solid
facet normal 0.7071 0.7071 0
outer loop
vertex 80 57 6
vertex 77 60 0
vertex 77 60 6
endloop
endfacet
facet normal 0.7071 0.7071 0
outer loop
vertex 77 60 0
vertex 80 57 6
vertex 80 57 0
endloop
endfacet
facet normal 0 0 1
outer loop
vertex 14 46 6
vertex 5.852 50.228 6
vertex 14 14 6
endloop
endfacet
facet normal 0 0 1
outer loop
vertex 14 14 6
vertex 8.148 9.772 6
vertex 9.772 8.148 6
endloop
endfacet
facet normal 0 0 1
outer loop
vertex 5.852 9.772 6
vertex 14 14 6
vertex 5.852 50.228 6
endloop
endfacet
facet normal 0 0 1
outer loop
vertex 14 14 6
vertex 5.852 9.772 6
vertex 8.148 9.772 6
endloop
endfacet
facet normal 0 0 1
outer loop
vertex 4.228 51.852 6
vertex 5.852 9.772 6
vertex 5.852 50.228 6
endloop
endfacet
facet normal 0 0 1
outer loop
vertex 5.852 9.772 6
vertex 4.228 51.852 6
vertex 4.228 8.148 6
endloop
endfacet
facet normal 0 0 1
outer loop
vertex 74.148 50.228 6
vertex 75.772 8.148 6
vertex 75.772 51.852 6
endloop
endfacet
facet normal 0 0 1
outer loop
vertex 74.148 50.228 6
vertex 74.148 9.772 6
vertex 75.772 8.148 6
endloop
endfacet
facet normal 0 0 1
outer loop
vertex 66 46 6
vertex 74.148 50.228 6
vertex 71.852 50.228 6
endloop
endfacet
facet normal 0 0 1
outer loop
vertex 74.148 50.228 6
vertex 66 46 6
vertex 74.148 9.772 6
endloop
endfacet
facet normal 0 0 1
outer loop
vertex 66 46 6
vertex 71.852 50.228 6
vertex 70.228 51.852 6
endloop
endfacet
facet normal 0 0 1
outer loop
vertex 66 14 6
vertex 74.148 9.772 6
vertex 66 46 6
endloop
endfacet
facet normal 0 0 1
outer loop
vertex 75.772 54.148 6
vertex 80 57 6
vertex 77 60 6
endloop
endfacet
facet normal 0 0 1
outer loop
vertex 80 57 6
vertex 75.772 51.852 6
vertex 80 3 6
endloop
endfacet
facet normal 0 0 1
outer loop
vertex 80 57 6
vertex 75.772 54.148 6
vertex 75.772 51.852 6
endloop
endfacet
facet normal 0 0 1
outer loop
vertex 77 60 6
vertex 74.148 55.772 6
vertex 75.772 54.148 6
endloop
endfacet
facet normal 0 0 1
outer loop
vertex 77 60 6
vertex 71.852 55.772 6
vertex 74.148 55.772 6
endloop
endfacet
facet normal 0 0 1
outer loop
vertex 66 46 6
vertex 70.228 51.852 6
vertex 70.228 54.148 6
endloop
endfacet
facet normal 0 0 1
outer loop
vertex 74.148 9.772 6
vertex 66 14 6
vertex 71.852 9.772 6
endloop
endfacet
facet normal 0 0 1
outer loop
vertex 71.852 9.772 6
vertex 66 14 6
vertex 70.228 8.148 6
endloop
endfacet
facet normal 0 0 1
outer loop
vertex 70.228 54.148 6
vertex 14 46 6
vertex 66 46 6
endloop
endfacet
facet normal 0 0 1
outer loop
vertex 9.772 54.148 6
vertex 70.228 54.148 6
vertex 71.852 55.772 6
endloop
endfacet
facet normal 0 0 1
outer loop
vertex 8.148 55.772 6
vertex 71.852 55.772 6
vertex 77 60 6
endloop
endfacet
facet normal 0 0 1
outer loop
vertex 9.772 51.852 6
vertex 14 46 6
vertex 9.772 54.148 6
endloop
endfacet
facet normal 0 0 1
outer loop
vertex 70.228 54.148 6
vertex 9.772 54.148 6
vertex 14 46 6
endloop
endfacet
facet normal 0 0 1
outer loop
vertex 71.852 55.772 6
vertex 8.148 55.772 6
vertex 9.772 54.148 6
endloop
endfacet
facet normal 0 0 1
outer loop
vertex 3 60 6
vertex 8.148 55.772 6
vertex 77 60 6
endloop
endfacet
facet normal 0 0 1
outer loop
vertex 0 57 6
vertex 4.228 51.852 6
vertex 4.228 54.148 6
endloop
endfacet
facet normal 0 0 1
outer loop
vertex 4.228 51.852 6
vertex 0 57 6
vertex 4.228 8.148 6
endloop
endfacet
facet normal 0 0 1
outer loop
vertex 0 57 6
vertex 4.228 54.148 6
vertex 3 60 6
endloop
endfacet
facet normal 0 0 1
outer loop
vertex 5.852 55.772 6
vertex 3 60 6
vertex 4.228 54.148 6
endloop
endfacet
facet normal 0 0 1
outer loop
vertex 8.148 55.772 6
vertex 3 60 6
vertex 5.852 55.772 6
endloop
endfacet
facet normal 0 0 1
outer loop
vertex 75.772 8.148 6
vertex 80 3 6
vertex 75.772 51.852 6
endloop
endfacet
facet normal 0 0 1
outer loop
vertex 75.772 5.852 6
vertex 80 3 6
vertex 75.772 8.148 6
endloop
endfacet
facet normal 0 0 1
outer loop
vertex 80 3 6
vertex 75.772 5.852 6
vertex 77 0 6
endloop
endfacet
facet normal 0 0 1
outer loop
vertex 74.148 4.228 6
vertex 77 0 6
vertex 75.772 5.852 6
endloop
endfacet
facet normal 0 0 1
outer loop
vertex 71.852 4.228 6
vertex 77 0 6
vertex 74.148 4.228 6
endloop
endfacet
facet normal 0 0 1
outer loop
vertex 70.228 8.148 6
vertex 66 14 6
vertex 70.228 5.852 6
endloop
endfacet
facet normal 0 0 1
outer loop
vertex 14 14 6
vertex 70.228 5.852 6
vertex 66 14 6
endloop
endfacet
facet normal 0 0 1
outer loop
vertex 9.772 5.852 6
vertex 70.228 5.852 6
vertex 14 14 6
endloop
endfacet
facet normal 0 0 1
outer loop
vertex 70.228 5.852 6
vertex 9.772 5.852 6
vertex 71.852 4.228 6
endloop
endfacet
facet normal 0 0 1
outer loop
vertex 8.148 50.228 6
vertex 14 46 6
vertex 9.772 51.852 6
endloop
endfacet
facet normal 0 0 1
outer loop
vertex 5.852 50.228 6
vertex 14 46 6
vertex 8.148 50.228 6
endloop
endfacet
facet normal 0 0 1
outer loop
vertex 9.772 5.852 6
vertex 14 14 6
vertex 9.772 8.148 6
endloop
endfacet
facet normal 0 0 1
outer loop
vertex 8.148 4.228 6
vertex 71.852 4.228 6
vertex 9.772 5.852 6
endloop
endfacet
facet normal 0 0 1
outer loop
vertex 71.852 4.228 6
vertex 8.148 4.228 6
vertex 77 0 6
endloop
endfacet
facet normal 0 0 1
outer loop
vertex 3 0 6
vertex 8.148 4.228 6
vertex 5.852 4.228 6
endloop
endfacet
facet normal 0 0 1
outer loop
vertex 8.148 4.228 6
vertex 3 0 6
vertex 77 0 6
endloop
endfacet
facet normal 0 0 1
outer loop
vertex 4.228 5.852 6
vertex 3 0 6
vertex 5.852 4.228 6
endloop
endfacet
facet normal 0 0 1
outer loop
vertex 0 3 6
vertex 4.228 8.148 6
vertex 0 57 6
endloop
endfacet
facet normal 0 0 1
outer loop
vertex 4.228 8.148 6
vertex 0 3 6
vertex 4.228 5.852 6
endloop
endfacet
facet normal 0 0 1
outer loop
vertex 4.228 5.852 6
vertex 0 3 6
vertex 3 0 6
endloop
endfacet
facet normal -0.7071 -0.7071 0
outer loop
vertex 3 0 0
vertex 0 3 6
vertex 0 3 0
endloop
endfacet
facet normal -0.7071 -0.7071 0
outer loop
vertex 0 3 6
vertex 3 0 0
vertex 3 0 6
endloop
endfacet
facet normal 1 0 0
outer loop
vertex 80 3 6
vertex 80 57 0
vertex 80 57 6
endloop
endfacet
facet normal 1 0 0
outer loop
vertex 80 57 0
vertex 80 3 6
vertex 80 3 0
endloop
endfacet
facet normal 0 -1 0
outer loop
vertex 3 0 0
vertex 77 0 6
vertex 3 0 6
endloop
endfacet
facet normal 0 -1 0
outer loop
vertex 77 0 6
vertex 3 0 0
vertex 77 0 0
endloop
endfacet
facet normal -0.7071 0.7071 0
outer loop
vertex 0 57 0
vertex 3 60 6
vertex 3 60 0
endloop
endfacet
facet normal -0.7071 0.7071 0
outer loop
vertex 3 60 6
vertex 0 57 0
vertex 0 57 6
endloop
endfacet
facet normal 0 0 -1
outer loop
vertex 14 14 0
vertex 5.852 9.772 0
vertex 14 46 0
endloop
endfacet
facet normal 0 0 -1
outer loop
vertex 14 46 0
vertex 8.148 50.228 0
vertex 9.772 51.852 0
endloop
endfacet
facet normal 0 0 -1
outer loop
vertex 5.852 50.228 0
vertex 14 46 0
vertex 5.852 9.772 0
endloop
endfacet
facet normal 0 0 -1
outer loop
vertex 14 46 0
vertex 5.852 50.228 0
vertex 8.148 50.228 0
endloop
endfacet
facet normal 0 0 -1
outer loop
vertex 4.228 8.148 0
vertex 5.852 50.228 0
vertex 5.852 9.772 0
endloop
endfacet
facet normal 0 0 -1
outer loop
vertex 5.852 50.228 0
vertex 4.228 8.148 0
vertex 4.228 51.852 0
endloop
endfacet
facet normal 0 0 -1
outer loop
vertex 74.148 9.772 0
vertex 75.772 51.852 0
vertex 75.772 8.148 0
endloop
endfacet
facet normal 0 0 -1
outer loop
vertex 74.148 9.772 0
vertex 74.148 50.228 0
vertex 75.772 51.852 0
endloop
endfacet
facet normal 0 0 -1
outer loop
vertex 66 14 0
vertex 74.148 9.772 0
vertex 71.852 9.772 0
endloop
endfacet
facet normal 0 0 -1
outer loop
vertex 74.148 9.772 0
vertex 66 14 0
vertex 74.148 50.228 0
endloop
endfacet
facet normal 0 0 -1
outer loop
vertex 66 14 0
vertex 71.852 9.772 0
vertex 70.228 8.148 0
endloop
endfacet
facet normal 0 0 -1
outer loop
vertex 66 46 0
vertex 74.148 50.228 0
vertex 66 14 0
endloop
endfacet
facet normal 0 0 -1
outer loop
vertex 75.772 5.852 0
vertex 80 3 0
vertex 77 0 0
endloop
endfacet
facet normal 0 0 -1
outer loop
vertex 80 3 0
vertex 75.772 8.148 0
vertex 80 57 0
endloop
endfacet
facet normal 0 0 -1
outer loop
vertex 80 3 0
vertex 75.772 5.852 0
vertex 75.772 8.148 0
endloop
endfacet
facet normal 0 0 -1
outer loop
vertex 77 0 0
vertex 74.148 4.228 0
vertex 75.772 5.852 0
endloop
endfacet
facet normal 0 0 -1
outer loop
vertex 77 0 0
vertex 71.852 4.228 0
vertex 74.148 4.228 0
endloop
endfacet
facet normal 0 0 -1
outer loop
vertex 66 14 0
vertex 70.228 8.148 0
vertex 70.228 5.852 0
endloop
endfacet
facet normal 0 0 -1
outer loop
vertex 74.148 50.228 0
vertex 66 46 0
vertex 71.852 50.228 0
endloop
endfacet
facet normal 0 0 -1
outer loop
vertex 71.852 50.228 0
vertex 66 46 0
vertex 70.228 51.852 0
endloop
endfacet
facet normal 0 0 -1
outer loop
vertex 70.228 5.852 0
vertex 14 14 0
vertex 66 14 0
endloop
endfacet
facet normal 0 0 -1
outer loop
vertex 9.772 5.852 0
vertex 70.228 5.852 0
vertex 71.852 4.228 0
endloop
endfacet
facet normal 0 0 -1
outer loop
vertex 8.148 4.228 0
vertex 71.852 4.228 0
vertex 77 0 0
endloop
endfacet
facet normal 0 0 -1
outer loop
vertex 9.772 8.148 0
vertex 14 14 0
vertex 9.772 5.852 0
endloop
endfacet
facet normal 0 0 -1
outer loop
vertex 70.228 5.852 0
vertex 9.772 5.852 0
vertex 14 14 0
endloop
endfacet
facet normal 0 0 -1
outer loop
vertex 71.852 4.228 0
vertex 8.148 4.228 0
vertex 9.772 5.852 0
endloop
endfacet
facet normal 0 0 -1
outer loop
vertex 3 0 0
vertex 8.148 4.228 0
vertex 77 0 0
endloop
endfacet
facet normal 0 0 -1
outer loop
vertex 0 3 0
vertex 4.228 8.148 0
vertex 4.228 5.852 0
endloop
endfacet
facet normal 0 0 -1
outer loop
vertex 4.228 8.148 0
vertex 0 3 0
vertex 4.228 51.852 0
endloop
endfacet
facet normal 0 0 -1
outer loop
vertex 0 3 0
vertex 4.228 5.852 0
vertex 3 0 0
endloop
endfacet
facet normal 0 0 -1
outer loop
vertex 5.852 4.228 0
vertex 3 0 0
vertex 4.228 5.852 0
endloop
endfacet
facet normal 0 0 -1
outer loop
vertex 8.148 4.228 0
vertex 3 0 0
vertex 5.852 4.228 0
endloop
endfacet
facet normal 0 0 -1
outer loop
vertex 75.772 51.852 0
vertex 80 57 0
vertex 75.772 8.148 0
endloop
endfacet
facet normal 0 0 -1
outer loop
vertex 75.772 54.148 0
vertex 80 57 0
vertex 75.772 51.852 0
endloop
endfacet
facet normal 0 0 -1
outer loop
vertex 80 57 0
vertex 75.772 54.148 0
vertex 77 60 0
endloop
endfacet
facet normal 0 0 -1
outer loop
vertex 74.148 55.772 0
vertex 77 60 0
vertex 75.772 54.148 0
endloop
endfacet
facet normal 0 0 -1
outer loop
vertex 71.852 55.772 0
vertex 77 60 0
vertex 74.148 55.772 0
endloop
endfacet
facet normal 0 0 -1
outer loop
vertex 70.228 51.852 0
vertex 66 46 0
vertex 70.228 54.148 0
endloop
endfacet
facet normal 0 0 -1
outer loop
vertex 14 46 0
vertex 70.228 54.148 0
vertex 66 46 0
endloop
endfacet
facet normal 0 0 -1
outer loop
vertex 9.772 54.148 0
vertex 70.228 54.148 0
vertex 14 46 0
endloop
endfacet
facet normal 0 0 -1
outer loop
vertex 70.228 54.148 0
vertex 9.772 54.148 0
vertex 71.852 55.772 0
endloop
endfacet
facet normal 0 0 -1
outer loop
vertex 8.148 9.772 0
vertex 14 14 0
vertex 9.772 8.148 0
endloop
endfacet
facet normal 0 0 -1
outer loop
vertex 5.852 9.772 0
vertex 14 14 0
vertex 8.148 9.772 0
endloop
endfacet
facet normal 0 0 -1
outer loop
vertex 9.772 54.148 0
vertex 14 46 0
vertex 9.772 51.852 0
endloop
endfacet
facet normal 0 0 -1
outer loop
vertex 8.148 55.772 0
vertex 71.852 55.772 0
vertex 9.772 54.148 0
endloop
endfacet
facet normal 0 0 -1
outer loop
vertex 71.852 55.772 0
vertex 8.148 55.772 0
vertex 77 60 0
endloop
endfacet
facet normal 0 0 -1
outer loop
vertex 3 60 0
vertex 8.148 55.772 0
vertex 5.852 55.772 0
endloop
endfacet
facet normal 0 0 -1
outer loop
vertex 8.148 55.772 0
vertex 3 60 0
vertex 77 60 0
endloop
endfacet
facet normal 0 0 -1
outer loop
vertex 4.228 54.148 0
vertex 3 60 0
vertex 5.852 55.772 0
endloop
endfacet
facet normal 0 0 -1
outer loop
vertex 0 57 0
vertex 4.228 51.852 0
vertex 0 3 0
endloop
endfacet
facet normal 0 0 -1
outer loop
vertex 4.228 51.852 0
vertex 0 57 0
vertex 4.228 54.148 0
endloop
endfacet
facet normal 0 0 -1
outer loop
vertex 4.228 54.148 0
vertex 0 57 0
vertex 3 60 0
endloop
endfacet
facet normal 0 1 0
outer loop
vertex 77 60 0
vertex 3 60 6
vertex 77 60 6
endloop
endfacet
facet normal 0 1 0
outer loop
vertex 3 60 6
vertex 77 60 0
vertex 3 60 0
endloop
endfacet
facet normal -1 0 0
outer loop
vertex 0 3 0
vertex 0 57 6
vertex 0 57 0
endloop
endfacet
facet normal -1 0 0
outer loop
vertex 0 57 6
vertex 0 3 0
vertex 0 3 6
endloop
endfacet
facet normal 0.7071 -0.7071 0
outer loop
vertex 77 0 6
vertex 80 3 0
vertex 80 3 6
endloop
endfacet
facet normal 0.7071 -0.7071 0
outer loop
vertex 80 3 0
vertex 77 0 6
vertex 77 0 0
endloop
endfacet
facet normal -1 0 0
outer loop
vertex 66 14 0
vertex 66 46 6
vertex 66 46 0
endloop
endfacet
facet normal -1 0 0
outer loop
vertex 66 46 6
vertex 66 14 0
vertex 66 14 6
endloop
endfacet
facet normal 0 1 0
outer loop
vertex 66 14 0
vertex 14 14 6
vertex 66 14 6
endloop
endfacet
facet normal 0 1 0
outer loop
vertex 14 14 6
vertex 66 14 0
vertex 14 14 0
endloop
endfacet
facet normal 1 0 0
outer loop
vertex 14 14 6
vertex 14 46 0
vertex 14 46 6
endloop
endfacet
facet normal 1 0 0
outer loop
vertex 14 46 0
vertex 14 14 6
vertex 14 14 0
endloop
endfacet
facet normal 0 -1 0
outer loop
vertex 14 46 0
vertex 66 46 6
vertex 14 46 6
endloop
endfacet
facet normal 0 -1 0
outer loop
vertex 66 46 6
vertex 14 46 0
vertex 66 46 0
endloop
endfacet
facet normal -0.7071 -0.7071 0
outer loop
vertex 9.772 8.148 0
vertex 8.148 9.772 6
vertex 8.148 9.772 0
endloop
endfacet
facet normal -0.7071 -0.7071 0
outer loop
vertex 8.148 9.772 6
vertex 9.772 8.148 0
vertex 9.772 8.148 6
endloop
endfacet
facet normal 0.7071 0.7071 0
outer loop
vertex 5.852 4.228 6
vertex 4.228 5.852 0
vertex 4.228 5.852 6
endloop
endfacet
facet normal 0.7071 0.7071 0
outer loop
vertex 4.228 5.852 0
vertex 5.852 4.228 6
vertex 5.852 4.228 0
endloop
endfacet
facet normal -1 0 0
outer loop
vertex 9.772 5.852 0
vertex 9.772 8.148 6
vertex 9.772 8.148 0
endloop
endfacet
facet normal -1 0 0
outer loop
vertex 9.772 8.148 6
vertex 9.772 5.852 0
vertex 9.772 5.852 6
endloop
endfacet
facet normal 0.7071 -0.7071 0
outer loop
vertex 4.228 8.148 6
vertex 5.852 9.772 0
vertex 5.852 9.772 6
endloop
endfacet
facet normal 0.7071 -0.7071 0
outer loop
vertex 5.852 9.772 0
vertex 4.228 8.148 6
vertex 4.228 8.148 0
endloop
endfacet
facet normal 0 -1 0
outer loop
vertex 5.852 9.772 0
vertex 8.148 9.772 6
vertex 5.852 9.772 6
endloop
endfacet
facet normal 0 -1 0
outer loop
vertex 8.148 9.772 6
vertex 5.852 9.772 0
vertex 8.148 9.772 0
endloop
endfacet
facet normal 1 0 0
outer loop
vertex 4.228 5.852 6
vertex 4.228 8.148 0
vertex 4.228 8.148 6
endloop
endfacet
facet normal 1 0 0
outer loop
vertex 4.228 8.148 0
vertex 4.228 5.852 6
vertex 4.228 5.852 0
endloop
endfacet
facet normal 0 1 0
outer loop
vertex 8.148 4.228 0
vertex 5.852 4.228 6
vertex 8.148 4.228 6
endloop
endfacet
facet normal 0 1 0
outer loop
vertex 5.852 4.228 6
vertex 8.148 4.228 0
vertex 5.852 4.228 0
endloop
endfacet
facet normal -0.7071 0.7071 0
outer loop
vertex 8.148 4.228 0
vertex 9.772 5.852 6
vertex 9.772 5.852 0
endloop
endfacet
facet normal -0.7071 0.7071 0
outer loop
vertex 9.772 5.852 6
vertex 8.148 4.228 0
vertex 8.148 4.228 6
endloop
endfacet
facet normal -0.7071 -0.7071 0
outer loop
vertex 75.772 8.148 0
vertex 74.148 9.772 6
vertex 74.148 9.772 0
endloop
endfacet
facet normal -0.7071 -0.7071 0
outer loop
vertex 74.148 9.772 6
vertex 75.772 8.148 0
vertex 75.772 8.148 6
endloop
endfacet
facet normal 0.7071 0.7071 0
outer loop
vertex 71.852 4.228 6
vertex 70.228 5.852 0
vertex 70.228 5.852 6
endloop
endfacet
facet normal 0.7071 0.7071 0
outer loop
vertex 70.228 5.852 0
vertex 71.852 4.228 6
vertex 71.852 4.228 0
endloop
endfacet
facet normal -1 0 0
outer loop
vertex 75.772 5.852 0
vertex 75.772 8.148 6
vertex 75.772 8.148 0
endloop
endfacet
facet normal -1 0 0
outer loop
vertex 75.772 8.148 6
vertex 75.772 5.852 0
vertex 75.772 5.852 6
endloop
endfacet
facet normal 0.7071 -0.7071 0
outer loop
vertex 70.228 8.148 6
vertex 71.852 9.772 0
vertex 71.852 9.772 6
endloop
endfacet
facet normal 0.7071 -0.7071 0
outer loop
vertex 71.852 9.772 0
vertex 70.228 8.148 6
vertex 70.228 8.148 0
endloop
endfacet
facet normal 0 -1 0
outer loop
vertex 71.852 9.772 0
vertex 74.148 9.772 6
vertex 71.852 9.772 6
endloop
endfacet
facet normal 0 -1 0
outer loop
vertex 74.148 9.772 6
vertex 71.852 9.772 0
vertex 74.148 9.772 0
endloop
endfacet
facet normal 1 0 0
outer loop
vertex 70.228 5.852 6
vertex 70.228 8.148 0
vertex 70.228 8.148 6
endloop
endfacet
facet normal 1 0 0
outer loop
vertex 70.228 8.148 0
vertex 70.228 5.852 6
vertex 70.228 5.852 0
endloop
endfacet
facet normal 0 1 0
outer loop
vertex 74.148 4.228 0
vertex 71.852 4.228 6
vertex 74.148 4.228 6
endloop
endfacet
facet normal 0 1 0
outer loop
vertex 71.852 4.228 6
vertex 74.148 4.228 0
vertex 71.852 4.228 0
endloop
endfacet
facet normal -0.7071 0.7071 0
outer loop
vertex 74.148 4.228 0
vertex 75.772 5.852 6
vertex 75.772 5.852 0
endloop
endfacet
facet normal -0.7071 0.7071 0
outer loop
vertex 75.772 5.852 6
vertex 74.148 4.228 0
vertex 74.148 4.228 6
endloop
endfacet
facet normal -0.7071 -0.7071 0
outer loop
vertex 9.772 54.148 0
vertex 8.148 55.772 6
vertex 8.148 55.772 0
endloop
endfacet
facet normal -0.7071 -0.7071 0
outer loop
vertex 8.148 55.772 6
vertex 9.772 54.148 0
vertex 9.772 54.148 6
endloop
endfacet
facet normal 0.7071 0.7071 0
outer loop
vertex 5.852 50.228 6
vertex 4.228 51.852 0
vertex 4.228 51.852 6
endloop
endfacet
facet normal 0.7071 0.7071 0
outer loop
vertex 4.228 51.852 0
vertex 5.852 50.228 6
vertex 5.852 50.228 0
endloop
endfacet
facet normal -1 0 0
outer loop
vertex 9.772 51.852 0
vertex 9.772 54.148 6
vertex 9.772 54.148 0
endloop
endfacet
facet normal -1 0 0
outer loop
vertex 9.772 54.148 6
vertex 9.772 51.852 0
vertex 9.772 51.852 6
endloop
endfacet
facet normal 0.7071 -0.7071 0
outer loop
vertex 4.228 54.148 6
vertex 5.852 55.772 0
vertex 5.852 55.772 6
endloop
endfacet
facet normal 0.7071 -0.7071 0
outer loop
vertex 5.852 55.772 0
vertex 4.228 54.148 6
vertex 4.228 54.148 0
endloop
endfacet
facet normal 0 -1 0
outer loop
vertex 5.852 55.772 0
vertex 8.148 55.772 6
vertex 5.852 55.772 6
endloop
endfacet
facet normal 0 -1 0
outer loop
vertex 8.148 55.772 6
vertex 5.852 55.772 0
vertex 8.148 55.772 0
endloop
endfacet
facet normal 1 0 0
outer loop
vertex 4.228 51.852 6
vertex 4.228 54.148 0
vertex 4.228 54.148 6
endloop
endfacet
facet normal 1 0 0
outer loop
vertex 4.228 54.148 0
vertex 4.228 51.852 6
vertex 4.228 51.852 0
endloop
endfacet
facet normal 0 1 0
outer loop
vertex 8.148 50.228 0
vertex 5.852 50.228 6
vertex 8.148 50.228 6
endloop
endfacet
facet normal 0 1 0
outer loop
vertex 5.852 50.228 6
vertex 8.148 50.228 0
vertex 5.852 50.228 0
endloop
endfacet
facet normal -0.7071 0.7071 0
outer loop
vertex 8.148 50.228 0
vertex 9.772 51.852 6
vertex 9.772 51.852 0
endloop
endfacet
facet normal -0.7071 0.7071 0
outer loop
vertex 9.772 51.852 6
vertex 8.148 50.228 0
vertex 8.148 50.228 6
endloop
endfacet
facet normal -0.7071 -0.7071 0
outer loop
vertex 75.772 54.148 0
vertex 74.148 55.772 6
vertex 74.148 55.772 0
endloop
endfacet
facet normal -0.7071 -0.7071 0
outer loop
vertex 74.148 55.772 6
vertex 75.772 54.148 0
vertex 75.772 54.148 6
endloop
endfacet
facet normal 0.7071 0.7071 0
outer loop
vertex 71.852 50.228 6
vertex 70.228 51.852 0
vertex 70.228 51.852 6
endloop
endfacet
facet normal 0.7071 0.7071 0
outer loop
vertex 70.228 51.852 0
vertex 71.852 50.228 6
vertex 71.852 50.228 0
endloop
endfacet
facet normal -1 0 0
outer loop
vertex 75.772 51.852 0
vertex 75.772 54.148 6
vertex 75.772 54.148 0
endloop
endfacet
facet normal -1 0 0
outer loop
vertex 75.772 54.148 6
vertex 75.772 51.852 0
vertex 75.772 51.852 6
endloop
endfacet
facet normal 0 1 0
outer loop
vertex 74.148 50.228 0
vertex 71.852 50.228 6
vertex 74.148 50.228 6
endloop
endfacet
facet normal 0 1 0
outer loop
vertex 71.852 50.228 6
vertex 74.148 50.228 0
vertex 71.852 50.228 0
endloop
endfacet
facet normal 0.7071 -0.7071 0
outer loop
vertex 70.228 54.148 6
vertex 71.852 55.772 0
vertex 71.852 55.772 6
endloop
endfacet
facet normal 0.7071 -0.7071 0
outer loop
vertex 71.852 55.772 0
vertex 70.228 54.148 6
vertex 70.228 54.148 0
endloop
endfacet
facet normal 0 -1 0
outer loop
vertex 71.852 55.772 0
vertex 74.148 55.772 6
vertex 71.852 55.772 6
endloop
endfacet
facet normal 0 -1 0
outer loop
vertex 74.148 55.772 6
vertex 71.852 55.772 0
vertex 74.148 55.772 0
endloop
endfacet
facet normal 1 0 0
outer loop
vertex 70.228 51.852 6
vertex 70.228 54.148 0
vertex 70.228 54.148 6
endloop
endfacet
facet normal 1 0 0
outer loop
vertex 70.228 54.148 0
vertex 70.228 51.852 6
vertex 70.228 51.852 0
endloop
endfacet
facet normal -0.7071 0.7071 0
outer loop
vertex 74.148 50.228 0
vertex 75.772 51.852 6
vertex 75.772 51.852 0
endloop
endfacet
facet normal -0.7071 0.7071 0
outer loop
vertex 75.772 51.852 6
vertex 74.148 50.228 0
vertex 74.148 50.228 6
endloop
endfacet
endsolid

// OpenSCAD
$fn = 32;

// ----------------------------------------------------------------------
// Frame plate: 80 x 60 frame, 14 mm rails
// ----------------------------------------------------------------------

// --- parameters (mm) ---
plate_l = 80;             // plate length, X
plate_w = 60;             // plate width, Y
plate_t = 6;              // plate thickness, Z (extrusion height)
corner_c = 3;             // corner chamfer
frame_bar = 14;           // frame rail width
bolt_r = 3;               // corner bolt window radius
bolt_inset = 7;           // bolt centre inset from the edges

win_l = plate_l - 2 * frame_bar;  // window length
win_w = plate_w - 2 * frame_bar;  // window width
bolt_d = 2 * bolt_r;  // corner hole diameter

profile = [[3, 0], [77, 0], [80, 3], [80, 57], [77, 60], [3, 60], [0, 57], [0, 3]];  // primary outline, 8 points, counter clockwise
void_1 = [[14, 14], [66, 14], [66, 46], [14, 46]];  // the window, 4 points
void_2 = [[9.772, 8.148], [8.148, 9.772], [5.852, 9.772], [4.228, 8.148], [4.228, 5.852], [5.852, 4.228], [8.148, 4.228], [9.772, 5.852]];  // corner bolt window, 8 points
void_3 = [[75.772, 8.148], [74.148, 9.772], [71.852, 9.772], [70.228, 8.148], [70.228, 5.852], [71.852, 4.228], [74.148, 4.228], [75.772, 5.852]];  // corner bolt window, 8 points
void_4 = [[9.772, 54.148], [8.148, 55.772], [5.852, 55.772], [4.228, 54.148], [4.228, 51.852], [5.852, 50.228], [8.148, 50.228], [9.772, 51.852]];  // corner bolt window, 8 points
void_5 = [[75.772, 54.148], [74.148, 55.772], [71.852, 55.772], [70.228, 54.148], [70.228, 51.852], [71.852, 50.228], [74.148, 50.228], [75.772, 51.852]];  // corner bolt window, 8 points

// --- the one profile operation ---
difference() {
  linear_extrude(height = plate_t) polygon(points = profile);
  translate([0, 0, -1])
    linear_extrude(height = plate_t + 2) polygon(points = void_1);
  translate([0, 0, -1])
    linear_extrude(height = plate_t + 2) polygon(points = void_2);
  translate([0, 0, -1])
    linear_extrude(height = plate_t + 2) polygon(points = void_3);
  translate([0, 0, -1])
    linear_extrude(height = plate_t + 2) polygon(points = void_4);
  translate([0, 0, -1])
    linear_extrude(height = plate_t + 2) polygon(points = void_5);
}
